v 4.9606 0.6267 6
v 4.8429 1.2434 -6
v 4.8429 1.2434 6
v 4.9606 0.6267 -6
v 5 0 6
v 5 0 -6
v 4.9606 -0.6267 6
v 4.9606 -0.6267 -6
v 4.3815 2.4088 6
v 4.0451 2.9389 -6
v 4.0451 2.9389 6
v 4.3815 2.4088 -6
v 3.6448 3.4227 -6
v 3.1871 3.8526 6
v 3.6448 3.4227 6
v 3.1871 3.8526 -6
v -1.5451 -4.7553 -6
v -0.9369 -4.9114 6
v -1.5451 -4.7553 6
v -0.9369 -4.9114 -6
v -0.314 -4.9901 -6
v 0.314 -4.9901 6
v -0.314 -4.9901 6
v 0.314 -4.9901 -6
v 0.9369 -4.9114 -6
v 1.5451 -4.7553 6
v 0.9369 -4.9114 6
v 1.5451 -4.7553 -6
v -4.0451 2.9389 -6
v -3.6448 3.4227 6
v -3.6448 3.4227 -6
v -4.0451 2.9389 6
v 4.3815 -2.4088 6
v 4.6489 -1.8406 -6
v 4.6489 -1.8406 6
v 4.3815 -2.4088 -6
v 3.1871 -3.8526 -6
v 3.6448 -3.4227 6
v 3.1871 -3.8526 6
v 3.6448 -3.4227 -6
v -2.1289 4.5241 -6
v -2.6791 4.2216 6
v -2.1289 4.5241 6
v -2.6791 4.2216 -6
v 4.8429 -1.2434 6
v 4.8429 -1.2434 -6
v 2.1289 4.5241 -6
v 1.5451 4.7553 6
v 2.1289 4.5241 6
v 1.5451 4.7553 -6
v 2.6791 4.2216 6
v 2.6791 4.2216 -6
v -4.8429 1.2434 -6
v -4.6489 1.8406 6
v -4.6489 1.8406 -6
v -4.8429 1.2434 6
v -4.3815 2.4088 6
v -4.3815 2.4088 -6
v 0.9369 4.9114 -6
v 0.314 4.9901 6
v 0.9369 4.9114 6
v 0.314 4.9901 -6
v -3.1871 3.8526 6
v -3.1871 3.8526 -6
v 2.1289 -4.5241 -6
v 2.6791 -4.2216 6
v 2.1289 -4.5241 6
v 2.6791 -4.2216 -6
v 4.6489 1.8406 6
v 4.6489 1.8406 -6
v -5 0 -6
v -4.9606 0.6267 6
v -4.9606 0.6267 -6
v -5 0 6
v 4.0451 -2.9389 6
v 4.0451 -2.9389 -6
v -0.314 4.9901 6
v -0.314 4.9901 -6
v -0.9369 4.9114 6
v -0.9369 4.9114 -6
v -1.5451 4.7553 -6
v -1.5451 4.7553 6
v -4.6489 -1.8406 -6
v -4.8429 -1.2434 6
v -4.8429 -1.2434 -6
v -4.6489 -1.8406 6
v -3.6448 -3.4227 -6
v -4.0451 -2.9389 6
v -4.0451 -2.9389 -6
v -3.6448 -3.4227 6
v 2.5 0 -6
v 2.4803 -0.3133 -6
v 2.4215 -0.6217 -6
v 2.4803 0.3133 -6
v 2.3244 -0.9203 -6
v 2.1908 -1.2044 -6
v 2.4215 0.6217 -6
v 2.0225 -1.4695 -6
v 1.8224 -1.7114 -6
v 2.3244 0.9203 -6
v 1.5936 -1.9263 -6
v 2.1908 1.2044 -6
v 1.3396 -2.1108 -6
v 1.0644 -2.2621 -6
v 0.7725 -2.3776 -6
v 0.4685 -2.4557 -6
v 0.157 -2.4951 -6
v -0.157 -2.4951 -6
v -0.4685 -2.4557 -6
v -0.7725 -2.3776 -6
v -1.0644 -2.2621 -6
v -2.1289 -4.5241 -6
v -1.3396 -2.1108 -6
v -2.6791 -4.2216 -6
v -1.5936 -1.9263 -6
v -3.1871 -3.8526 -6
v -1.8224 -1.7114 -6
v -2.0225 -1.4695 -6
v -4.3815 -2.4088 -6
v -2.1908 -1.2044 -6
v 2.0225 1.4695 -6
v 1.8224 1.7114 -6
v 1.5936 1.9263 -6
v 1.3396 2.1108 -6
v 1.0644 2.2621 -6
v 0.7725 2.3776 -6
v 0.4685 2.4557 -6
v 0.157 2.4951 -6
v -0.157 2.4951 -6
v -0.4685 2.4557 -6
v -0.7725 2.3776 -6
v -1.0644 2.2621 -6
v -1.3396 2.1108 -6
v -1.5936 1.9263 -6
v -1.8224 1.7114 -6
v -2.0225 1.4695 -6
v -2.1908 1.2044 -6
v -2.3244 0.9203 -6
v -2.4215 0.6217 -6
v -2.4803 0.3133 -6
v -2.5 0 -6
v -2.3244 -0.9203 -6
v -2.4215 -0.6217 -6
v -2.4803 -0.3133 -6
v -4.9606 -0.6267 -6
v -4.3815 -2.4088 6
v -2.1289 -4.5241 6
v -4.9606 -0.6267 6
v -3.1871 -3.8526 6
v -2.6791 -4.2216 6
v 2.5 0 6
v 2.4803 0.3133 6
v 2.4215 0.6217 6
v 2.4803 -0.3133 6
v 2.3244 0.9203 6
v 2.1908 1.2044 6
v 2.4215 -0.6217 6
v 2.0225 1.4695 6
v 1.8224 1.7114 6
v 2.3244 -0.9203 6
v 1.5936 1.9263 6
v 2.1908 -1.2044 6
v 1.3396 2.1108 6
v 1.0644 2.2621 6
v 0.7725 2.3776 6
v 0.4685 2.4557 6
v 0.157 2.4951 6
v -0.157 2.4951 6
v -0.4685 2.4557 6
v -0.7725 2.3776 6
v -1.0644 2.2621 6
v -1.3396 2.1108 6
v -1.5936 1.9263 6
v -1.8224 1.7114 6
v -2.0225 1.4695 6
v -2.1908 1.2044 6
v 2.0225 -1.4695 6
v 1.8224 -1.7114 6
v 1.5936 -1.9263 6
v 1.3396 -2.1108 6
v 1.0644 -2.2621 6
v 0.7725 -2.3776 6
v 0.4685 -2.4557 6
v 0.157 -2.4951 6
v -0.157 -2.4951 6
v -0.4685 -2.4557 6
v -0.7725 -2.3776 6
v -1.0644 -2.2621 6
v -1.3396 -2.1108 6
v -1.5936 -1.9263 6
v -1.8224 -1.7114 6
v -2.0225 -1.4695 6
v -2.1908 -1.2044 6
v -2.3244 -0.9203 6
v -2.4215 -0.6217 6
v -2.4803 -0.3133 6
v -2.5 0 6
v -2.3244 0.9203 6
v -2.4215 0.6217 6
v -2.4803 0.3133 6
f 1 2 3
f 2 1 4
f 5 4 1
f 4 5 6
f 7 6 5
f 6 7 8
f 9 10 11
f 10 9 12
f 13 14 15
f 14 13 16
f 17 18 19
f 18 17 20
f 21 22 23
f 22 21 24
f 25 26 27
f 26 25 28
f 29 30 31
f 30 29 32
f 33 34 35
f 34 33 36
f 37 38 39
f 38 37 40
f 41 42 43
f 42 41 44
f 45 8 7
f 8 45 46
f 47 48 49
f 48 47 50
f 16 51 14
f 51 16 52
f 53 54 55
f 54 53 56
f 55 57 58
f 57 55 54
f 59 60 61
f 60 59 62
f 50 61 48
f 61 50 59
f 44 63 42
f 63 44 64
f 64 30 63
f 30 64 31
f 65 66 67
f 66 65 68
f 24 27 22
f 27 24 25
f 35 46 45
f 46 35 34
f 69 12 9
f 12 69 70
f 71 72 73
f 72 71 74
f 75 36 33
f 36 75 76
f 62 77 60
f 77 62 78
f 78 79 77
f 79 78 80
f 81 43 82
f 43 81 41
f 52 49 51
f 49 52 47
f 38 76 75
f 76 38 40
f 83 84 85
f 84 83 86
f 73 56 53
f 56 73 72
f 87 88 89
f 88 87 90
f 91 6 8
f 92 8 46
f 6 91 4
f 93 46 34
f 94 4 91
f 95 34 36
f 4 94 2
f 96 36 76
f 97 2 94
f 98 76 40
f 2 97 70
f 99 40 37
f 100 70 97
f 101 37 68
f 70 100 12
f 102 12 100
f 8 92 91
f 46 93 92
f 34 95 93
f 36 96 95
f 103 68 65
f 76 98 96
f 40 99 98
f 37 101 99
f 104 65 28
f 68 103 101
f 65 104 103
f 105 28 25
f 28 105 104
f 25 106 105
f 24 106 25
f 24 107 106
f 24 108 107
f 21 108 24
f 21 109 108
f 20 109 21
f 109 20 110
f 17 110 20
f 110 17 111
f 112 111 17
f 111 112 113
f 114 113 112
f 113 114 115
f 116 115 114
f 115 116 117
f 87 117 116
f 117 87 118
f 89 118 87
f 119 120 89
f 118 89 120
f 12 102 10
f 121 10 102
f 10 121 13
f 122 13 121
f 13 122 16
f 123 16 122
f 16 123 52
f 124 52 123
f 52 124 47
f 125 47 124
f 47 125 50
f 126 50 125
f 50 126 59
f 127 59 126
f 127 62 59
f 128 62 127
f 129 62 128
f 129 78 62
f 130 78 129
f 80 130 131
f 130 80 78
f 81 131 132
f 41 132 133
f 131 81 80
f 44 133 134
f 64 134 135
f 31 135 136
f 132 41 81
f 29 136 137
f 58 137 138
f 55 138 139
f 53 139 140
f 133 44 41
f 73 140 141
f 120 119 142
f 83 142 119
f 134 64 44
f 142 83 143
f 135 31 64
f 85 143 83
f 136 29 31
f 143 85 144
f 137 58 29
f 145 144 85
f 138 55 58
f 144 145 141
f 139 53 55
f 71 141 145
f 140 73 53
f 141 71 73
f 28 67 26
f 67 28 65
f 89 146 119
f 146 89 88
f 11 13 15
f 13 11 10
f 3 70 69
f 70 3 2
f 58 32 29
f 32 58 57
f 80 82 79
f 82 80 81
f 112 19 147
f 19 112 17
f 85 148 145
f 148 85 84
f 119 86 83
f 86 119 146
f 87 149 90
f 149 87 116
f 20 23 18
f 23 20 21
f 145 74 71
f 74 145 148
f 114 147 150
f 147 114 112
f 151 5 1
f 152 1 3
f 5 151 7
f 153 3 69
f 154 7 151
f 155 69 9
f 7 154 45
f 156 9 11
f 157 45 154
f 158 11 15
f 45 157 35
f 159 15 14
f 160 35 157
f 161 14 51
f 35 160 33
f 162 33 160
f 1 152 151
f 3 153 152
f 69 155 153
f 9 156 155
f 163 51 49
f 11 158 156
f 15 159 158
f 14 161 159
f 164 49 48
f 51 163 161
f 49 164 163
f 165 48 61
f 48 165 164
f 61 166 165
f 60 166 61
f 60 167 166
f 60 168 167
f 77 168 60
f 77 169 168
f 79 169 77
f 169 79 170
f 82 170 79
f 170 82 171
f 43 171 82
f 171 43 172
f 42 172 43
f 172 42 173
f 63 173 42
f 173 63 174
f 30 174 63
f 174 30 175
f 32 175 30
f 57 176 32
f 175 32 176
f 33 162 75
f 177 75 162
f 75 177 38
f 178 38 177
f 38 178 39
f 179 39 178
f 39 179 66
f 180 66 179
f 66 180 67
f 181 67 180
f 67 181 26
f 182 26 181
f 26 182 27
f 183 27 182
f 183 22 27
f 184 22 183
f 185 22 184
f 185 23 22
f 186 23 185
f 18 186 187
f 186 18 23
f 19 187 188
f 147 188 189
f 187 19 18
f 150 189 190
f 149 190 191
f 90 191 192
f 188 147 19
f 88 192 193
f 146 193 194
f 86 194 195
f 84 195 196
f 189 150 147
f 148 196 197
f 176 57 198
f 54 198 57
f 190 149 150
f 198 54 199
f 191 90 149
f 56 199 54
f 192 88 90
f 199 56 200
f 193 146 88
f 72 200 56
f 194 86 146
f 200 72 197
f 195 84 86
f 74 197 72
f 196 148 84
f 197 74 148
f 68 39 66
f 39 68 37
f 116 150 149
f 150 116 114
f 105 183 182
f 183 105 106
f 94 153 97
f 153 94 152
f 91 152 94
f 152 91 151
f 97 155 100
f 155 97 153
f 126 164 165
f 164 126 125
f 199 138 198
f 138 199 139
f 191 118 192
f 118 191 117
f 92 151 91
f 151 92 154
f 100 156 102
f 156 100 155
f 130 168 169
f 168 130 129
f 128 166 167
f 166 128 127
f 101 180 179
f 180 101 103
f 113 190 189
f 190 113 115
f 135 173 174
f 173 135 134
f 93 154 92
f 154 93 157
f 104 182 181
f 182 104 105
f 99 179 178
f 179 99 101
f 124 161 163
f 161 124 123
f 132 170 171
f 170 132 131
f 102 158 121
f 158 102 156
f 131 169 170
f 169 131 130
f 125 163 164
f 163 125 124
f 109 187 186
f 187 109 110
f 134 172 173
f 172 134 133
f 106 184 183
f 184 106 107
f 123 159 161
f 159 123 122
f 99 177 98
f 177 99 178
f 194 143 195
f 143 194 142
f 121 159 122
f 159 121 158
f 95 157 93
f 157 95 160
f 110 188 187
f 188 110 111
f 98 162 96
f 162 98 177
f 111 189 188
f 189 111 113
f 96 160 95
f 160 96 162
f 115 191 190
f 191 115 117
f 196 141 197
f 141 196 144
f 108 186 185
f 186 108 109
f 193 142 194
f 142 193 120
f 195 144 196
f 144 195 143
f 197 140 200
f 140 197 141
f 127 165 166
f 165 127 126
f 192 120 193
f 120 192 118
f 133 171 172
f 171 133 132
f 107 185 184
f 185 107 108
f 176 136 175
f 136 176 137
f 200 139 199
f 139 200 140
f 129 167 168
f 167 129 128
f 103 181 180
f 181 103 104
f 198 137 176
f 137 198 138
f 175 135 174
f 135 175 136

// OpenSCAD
$fn = 50;


difference() {
	union() {
		translate(v = [0, 0, -6.0000000000]) {
			cylinder(h = 12, r = 5.0000000000);
		}
	}
	union() {
		translate(v = [0, 0, -100.0000000000]) {
			cylinder(h = 200, r = 2.5000000000);
		}
	}
}
